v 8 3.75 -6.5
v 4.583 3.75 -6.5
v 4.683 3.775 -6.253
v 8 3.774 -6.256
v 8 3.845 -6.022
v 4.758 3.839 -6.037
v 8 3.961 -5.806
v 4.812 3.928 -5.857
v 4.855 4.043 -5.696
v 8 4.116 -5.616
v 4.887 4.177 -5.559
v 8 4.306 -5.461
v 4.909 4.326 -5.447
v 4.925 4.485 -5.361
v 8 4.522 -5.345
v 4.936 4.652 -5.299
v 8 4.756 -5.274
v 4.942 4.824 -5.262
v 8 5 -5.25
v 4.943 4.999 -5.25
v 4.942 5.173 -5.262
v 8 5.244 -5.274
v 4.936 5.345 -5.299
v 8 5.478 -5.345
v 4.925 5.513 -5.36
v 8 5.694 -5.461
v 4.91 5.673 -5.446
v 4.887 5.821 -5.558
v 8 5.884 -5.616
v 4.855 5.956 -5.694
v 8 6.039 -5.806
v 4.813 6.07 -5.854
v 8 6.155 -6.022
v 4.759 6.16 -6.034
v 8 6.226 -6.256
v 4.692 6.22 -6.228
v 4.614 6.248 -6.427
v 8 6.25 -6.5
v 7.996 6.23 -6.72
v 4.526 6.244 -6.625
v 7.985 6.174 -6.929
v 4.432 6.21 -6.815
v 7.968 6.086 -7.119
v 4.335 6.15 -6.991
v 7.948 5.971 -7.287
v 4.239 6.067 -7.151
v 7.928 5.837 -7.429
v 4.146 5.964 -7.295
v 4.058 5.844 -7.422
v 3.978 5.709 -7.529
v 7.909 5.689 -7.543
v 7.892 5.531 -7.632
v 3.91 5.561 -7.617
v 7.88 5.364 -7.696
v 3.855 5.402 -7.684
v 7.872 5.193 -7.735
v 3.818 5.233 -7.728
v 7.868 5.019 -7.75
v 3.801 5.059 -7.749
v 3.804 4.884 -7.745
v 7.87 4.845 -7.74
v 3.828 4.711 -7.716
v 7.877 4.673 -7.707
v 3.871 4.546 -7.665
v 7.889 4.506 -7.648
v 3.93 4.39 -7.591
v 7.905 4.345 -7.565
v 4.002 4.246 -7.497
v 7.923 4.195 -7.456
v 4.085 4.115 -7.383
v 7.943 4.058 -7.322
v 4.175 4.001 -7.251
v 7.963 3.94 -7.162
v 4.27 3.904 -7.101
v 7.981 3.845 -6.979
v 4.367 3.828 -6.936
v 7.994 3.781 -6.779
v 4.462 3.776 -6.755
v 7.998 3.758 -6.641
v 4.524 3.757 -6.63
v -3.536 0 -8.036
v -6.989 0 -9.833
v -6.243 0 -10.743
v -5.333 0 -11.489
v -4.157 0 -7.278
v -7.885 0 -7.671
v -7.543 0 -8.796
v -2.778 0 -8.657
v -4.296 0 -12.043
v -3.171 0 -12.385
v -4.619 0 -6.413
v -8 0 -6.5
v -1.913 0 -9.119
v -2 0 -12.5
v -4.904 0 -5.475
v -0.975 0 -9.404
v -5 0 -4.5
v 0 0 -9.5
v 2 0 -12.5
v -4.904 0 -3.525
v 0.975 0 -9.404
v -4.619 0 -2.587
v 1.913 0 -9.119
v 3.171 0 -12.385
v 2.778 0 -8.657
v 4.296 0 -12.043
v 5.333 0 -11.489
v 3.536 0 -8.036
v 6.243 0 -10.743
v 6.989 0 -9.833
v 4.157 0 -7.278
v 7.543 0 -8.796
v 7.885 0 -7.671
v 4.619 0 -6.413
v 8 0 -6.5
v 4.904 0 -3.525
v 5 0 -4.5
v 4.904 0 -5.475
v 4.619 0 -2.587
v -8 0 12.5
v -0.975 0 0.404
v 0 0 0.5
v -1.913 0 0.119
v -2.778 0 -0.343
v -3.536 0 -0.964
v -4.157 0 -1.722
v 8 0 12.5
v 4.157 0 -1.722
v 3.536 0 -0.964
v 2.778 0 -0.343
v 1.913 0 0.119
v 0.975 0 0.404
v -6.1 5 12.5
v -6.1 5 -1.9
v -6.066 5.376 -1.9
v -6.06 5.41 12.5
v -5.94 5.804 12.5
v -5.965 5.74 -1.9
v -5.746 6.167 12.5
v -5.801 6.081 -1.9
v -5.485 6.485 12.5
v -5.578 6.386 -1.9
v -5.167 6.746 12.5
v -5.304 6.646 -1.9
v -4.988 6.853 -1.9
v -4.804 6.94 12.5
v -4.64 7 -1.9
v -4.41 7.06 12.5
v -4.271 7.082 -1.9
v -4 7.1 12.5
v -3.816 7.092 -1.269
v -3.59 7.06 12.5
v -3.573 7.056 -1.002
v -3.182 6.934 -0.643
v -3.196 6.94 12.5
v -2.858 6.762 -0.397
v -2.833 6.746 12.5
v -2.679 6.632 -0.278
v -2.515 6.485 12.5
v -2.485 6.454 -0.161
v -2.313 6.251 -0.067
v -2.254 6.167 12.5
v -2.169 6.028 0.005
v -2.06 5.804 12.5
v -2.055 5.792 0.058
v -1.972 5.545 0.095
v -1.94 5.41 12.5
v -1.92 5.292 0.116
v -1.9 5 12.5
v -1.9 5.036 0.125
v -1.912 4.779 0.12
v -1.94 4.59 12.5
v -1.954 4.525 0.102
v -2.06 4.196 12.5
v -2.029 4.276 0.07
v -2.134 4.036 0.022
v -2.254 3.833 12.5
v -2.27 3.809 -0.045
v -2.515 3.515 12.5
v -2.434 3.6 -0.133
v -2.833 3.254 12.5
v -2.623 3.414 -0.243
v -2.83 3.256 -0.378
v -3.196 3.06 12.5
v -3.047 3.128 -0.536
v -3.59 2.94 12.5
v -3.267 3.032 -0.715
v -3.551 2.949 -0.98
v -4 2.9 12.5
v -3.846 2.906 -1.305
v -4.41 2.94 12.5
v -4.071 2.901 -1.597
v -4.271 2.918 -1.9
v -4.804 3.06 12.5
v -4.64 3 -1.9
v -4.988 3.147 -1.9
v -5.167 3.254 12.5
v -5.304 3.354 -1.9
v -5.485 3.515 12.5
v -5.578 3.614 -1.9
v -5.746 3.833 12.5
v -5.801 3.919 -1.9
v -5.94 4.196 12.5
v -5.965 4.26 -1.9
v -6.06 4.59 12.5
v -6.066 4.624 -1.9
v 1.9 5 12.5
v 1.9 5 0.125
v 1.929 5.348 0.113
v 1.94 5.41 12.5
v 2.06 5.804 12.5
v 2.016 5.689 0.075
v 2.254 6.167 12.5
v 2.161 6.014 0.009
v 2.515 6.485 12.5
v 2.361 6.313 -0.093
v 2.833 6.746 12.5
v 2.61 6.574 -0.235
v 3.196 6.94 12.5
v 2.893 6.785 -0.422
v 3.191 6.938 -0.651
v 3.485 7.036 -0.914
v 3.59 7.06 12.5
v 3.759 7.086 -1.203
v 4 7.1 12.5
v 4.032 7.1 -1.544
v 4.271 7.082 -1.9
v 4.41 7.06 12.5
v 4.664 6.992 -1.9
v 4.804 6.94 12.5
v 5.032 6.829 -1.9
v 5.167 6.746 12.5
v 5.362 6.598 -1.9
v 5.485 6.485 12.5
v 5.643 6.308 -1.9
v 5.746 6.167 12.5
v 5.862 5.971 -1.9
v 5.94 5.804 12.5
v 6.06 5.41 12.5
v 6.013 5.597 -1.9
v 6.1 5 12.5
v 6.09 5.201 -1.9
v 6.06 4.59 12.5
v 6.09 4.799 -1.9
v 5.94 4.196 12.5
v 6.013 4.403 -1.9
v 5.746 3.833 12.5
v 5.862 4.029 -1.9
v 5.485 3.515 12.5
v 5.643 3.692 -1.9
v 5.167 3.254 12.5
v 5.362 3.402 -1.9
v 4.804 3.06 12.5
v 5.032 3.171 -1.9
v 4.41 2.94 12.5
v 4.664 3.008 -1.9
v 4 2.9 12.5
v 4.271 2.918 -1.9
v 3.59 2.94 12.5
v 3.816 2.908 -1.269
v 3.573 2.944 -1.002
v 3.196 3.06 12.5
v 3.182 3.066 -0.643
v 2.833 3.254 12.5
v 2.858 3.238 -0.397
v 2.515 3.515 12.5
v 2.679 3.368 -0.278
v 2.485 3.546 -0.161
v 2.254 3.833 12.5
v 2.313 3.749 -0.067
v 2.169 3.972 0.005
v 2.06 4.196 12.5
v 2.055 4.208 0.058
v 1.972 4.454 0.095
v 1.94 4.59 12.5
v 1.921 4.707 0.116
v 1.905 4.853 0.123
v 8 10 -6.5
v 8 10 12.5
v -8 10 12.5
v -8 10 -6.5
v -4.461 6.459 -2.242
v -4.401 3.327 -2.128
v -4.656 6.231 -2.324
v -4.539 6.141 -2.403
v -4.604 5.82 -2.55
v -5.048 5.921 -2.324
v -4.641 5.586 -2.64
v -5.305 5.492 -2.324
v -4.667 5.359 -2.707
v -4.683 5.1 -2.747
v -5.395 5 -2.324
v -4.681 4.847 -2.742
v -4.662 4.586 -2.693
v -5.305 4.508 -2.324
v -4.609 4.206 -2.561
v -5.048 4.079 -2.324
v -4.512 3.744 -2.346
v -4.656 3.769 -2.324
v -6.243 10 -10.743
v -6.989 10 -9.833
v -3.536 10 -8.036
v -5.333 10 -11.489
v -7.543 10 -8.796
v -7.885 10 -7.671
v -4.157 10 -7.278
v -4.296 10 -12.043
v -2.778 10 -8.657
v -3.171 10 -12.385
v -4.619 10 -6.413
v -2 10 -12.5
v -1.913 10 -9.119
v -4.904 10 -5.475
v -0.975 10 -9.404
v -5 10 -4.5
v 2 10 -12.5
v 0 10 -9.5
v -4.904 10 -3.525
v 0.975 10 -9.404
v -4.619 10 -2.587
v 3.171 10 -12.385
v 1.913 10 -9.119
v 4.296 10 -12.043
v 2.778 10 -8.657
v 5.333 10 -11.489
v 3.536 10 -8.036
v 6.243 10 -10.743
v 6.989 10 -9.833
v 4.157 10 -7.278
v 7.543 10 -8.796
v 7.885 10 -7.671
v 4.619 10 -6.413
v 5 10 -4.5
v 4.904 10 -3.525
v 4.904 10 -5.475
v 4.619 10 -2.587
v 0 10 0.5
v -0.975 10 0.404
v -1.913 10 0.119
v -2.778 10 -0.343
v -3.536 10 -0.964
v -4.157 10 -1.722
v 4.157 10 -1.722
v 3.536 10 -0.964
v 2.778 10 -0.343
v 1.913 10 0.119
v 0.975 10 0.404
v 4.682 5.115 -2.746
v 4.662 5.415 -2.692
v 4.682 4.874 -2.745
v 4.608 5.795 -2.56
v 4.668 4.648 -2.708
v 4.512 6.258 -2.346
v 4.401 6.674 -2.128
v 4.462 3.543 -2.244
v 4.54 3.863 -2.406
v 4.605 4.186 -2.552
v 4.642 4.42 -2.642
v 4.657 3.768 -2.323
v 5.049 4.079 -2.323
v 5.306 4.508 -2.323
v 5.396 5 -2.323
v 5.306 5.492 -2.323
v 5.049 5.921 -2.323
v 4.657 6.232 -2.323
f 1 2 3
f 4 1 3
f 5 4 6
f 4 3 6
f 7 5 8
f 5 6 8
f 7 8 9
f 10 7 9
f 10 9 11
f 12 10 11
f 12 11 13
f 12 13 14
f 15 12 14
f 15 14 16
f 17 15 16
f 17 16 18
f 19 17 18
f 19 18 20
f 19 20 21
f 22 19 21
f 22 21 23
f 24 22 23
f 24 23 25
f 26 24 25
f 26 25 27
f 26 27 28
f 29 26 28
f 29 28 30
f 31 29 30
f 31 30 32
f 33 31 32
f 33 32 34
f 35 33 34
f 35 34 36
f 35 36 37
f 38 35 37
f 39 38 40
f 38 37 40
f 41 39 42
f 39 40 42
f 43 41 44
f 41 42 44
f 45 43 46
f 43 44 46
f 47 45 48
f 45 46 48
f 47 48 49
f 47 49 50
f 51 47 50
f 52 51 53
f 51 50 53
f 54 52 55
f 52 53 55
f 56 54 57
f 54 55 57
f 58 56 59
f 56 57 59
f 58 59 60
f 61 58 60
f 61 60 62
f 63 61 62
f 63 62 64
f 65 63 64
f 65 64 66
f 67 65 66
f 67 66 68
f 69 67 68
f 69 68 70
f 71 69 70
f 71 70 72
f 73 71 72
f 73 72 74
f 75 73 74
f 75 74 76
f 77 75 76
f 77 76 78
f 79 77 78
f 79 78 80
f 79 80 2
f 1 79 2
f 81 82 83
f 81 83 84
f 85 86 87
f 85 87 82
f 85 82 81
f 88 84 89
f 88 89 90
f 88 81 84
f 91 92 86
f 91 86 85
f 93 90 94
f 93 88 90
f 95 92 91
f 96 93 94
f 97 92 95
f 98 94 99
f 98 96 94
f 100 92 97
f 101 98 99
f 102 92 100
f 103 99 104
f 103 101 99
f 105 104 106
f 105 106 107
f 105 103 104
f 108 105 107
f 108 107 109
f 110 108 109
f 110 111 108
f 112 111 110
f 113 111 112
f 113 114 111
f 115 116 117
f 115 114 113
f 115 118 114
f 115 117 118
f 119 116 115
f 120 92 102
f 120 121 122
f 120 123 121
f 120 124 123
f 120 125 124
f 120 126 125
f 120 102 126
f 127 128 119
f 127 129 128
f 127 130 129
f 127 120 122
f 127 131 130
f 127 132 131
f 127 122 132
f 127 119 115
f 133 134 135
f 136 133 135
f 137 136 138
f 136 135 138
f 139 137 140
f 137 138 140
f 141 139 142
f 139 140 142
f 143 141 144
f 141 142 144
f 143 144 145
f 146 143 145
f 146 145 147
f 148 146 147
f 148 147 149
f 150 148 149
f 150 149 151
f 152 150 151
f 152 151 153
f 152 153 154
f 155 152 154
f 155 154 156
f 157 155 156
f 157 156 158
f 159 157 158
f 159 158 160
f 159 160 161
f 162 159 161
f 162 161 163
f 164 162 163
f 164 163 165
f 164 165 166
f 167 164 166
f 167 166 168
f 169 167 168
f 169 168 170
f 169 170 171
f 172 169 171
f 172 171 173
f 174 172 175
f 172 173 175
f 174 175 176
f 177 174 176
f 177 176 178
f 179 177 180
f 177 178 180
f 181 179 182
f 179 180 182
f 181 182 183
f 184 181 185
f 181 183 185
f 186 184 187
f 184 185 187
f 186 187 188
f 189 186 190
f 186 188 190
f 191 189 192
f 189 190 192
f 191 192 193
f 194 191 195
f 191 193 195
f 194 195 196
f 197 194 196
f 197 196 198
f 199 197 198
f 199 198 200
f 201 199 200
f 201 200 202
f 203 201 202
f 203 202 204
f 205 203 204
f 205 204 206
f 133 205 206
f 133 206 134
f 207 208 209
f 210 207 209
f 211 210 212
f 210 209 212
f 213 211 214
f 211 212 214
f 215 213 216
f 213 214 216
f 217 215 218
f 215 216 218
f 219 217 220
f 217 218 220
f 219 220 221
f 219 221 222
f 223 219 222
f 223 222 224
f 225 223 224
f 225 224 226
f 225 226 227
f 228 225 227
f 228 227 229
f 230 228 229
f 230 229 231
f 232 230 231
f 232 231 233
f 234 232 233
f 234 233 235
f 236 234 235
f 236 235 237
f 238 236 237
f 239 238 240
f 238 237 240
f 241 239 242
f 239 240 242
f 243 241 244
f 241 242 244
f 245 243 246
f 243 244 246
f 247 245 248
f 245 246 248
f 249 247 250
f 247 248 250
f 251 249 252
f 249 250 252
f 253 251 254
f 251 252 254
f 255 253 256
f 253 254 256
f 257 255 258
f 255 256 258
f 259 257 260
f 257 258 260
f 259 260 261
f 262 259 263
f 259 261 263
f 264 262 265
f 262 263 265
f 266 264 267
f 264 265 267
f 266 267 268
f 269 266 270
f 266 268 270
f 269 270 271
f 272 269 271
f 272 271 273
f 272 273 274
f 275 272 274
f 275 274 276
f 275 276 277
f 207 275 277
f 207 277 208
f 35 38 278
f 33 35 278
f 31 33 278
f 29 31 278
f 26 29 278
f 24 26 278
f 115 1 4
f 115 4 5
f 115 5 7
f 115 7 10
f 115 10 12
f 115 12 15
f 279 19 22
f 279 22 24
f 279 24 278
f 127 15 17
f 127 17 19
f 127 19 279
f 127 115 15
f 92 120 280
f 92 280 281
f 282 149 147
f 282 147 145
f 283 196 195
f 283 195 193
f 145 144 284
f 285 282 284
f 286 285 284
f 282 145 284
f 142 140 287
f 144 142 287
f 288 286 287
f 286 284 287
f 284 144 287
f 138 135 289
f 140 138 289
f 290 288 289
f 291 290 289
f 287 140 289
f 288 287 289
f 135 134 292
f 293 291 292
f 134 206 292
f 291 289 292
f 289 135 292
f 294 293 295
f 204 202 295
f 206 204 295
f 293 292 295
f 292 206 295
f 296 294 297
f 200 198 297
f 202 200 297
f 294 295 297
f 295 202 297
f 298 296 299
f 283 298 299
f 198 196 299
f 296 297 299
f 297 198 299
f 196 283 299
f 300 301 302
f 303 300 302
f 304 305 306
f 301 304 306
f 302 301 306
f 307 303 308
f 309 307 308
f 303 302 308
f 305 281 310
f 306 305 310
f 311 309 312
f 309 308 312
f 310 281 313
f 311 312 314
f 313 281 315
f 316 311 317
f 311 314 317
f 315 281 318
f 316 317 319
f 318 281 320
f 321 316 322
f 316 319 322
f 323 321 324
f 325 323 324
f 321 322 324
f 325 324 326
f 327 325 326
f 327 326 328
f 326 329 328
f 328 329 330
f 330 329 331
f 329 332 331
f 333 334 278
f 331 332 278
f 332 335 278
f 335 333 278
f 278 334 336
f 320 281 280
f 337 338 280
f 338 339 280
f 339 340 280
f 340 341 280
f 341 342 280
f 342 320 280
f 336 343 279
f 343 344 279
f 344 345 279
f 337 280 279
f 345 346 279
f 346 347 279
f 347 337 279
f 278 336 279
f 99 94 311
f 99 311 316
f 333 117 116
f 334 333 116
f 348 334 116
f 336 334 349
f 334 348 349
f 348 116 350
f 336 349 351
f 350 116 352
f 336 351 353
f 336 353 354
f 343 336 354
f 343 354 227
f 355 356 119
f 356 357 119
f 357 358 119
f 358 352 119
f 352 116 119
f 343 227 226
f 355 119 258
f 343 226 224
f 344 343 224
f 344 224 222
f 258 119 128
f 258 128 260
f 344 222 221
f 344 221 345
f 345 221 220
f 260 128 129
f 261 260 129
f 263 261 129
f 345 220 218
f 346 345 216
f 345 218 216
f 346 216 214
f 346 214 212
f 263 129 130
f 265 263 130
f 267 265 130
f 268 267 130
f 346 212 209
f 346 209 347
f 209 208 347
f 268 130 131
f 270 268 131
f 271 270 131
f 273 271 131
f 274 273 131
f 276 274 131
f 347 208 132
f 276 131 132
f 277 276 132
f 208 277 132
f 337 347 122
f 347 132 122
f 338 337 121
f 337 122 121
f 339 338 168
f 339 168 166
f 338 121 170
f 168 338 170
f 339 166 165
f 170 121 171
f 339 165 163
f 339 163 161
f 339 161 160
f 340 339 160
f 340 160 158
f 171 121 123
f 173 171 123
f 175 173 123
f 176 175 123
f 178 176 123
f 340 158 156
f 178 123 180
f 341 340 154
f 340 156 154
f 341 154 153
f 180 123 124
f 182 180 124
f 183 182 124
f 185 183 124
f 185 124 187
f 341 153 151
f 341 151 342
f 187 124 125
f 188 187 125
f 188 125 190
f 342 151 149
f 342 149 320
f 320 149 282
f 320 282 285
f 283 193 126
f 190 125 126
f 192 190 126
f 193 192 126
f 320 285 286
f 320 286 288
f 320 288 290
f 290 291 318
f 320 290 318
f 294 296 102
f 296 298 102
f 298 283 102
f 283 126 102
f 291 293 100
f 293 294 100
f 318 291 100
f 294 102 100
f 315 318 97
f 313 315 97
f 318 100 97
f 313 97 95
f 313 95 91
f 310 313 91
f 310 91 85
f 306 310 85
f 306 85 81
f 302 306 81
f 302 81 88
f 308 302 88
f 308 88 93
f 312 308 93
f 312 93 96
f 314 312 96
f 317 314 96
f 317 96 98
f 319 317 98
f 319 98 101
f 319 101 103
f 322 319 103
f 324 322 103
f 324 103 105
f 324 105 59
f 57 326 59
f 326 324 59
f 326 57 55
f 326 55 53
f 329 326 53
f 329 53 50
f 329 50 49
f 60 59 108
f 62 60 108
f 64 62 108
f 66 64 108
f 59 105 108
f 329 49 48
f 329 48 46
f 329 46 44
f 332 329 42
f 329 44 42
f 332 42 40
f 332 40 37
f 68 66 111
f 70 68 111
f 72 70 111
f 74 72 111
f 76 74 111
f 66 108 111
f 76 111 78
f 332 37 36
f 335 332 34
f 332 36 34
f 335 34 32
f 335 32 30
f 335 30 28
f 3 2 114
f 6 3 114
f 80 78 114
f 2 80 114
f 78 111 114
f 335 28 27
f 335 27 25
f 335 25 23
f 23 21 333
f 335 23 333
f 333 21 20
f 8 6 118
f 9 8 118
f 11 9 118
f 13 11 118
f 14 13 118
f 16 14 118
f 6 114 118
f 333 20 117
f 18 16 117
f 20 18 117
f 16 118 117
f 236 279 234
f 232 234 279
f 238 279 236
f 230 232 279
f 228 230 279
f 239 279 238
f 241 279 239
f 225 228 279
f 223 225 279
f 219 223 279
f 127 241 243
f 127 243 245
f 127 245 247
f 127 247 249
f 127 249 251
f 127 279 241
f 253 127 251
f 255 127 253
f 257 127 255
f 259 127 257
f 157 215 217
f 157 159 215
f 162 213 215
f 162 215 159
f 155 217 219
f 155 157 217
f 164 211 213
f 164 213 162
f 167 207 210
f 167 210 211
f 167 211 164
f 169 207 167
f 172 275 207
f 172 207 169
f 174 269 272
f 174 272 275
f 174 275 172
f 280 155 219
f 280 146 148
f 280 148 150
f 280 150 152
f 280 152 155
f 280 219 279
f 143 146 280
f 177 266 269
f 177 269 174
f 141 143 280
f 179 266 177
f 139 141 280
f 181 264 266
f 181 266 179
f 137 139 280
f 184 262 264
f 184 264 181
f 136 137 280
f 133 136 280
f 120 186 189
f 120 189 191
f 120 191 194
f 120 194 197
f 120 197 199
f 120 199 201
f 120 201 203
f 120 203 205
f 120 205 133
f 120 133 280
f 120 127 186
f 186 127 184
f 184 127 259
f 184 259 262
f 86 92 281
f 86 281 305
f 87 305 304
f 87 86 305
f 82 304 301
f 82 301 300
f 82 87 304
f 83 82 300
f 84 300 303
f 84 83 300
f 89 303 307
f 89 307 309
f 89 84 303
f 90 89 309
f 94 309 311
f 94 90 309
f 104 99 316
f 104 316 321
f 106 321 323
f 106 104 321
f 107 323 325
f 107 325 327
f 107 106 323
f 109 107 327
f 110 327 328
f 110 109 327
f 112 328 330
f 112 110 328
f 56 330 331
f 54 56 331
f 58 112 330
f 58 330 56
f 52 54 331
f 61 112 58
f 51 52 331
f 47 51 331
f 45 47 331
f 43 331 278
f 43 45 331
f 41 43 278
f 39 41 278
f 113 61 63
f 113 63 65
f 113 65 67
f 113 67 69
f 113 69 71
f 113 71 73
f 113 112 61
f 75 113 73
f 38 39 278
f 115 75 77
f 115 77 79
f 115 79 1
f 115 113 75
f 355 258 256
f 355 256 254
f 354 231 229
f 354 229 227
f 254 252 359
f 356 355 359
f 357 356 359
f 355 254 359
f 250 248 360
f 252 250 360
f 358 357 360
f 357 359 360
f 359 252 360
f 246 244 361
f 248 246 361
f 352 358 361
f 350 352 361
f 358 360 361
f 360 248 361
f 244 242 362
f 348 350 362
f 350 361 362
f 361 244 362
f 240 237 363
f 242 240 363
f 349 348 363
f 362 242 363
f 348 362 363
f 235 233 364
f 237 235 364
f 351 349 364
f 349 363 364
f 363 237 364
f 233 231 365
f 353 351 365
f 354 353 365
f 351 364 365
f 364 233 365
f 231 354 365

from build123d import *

# Parameters (mm, degrees)
F0_R     = 5
F1_DEPTH = 10
F3_D     = 4.2
F3_DEPTH = 14.4
F3_TIP   = 1.2618073
F5_D     = 2.5
F5_DEPTH = 8
F5_START = 0.1316528
F5_TIP   = 0.7510757738


with BuildPart() as f1:
    # F0 (on Front) → F1 (new body)
    with BuildSketch(Plane.XZ):
        with BuildLine():
            Line((8, 12.5), (-8, 12.5))
            Line((-8, 12.5), (-8, -6.5))
            ThreePointArc((-8, -6.5), (-6.2426406871, -10.7426406871), (-2, -12.5))
            Line((-2, -12.5), (2, -12.5))
            ThreePointArc((2, -12.5), (6.2426406871, -10.7426406871), (8, -6.5))
            Line((8, -6.5), (8, 12.5))
        make_face()
        with Locations((0, -4.5)):
            Circle(F0_R, mode=Mode.SUBTRACT)
    extrude(amount=-F1_DEPTH)

    # F3
    with Locations(Plane.XY.offset(12.5)):
        with Locations((-4, 5), (4, 5)):
            Hole(F3_D / 2, depth=F3_DEPTH)
            with Locations((0, 0, -(F3_DEPTH + F3_TIP / 2))):  # 118° drill point
                Cone(0, F3_D / 2, F3_TIP, mode=Mode.SUBTRACT)

    # F5
    # its depths count from where the whole tool has entered the part; down to there all is cleared
    with Locations(Plane.YZ.offset(8).offset(-F5_START)):
        with Locations((5, -6.5)):
            Hole(F5_D / 2, depth=F5_DEPTH)
            with Locations((0, 0, -(F5_DEPTH + F5_TIP / 2))):  # 118° drill point
                Cone(0, F5_D / 2, F5_TIP, mode=Mode.SUBTRACT)


solid = f1.part
